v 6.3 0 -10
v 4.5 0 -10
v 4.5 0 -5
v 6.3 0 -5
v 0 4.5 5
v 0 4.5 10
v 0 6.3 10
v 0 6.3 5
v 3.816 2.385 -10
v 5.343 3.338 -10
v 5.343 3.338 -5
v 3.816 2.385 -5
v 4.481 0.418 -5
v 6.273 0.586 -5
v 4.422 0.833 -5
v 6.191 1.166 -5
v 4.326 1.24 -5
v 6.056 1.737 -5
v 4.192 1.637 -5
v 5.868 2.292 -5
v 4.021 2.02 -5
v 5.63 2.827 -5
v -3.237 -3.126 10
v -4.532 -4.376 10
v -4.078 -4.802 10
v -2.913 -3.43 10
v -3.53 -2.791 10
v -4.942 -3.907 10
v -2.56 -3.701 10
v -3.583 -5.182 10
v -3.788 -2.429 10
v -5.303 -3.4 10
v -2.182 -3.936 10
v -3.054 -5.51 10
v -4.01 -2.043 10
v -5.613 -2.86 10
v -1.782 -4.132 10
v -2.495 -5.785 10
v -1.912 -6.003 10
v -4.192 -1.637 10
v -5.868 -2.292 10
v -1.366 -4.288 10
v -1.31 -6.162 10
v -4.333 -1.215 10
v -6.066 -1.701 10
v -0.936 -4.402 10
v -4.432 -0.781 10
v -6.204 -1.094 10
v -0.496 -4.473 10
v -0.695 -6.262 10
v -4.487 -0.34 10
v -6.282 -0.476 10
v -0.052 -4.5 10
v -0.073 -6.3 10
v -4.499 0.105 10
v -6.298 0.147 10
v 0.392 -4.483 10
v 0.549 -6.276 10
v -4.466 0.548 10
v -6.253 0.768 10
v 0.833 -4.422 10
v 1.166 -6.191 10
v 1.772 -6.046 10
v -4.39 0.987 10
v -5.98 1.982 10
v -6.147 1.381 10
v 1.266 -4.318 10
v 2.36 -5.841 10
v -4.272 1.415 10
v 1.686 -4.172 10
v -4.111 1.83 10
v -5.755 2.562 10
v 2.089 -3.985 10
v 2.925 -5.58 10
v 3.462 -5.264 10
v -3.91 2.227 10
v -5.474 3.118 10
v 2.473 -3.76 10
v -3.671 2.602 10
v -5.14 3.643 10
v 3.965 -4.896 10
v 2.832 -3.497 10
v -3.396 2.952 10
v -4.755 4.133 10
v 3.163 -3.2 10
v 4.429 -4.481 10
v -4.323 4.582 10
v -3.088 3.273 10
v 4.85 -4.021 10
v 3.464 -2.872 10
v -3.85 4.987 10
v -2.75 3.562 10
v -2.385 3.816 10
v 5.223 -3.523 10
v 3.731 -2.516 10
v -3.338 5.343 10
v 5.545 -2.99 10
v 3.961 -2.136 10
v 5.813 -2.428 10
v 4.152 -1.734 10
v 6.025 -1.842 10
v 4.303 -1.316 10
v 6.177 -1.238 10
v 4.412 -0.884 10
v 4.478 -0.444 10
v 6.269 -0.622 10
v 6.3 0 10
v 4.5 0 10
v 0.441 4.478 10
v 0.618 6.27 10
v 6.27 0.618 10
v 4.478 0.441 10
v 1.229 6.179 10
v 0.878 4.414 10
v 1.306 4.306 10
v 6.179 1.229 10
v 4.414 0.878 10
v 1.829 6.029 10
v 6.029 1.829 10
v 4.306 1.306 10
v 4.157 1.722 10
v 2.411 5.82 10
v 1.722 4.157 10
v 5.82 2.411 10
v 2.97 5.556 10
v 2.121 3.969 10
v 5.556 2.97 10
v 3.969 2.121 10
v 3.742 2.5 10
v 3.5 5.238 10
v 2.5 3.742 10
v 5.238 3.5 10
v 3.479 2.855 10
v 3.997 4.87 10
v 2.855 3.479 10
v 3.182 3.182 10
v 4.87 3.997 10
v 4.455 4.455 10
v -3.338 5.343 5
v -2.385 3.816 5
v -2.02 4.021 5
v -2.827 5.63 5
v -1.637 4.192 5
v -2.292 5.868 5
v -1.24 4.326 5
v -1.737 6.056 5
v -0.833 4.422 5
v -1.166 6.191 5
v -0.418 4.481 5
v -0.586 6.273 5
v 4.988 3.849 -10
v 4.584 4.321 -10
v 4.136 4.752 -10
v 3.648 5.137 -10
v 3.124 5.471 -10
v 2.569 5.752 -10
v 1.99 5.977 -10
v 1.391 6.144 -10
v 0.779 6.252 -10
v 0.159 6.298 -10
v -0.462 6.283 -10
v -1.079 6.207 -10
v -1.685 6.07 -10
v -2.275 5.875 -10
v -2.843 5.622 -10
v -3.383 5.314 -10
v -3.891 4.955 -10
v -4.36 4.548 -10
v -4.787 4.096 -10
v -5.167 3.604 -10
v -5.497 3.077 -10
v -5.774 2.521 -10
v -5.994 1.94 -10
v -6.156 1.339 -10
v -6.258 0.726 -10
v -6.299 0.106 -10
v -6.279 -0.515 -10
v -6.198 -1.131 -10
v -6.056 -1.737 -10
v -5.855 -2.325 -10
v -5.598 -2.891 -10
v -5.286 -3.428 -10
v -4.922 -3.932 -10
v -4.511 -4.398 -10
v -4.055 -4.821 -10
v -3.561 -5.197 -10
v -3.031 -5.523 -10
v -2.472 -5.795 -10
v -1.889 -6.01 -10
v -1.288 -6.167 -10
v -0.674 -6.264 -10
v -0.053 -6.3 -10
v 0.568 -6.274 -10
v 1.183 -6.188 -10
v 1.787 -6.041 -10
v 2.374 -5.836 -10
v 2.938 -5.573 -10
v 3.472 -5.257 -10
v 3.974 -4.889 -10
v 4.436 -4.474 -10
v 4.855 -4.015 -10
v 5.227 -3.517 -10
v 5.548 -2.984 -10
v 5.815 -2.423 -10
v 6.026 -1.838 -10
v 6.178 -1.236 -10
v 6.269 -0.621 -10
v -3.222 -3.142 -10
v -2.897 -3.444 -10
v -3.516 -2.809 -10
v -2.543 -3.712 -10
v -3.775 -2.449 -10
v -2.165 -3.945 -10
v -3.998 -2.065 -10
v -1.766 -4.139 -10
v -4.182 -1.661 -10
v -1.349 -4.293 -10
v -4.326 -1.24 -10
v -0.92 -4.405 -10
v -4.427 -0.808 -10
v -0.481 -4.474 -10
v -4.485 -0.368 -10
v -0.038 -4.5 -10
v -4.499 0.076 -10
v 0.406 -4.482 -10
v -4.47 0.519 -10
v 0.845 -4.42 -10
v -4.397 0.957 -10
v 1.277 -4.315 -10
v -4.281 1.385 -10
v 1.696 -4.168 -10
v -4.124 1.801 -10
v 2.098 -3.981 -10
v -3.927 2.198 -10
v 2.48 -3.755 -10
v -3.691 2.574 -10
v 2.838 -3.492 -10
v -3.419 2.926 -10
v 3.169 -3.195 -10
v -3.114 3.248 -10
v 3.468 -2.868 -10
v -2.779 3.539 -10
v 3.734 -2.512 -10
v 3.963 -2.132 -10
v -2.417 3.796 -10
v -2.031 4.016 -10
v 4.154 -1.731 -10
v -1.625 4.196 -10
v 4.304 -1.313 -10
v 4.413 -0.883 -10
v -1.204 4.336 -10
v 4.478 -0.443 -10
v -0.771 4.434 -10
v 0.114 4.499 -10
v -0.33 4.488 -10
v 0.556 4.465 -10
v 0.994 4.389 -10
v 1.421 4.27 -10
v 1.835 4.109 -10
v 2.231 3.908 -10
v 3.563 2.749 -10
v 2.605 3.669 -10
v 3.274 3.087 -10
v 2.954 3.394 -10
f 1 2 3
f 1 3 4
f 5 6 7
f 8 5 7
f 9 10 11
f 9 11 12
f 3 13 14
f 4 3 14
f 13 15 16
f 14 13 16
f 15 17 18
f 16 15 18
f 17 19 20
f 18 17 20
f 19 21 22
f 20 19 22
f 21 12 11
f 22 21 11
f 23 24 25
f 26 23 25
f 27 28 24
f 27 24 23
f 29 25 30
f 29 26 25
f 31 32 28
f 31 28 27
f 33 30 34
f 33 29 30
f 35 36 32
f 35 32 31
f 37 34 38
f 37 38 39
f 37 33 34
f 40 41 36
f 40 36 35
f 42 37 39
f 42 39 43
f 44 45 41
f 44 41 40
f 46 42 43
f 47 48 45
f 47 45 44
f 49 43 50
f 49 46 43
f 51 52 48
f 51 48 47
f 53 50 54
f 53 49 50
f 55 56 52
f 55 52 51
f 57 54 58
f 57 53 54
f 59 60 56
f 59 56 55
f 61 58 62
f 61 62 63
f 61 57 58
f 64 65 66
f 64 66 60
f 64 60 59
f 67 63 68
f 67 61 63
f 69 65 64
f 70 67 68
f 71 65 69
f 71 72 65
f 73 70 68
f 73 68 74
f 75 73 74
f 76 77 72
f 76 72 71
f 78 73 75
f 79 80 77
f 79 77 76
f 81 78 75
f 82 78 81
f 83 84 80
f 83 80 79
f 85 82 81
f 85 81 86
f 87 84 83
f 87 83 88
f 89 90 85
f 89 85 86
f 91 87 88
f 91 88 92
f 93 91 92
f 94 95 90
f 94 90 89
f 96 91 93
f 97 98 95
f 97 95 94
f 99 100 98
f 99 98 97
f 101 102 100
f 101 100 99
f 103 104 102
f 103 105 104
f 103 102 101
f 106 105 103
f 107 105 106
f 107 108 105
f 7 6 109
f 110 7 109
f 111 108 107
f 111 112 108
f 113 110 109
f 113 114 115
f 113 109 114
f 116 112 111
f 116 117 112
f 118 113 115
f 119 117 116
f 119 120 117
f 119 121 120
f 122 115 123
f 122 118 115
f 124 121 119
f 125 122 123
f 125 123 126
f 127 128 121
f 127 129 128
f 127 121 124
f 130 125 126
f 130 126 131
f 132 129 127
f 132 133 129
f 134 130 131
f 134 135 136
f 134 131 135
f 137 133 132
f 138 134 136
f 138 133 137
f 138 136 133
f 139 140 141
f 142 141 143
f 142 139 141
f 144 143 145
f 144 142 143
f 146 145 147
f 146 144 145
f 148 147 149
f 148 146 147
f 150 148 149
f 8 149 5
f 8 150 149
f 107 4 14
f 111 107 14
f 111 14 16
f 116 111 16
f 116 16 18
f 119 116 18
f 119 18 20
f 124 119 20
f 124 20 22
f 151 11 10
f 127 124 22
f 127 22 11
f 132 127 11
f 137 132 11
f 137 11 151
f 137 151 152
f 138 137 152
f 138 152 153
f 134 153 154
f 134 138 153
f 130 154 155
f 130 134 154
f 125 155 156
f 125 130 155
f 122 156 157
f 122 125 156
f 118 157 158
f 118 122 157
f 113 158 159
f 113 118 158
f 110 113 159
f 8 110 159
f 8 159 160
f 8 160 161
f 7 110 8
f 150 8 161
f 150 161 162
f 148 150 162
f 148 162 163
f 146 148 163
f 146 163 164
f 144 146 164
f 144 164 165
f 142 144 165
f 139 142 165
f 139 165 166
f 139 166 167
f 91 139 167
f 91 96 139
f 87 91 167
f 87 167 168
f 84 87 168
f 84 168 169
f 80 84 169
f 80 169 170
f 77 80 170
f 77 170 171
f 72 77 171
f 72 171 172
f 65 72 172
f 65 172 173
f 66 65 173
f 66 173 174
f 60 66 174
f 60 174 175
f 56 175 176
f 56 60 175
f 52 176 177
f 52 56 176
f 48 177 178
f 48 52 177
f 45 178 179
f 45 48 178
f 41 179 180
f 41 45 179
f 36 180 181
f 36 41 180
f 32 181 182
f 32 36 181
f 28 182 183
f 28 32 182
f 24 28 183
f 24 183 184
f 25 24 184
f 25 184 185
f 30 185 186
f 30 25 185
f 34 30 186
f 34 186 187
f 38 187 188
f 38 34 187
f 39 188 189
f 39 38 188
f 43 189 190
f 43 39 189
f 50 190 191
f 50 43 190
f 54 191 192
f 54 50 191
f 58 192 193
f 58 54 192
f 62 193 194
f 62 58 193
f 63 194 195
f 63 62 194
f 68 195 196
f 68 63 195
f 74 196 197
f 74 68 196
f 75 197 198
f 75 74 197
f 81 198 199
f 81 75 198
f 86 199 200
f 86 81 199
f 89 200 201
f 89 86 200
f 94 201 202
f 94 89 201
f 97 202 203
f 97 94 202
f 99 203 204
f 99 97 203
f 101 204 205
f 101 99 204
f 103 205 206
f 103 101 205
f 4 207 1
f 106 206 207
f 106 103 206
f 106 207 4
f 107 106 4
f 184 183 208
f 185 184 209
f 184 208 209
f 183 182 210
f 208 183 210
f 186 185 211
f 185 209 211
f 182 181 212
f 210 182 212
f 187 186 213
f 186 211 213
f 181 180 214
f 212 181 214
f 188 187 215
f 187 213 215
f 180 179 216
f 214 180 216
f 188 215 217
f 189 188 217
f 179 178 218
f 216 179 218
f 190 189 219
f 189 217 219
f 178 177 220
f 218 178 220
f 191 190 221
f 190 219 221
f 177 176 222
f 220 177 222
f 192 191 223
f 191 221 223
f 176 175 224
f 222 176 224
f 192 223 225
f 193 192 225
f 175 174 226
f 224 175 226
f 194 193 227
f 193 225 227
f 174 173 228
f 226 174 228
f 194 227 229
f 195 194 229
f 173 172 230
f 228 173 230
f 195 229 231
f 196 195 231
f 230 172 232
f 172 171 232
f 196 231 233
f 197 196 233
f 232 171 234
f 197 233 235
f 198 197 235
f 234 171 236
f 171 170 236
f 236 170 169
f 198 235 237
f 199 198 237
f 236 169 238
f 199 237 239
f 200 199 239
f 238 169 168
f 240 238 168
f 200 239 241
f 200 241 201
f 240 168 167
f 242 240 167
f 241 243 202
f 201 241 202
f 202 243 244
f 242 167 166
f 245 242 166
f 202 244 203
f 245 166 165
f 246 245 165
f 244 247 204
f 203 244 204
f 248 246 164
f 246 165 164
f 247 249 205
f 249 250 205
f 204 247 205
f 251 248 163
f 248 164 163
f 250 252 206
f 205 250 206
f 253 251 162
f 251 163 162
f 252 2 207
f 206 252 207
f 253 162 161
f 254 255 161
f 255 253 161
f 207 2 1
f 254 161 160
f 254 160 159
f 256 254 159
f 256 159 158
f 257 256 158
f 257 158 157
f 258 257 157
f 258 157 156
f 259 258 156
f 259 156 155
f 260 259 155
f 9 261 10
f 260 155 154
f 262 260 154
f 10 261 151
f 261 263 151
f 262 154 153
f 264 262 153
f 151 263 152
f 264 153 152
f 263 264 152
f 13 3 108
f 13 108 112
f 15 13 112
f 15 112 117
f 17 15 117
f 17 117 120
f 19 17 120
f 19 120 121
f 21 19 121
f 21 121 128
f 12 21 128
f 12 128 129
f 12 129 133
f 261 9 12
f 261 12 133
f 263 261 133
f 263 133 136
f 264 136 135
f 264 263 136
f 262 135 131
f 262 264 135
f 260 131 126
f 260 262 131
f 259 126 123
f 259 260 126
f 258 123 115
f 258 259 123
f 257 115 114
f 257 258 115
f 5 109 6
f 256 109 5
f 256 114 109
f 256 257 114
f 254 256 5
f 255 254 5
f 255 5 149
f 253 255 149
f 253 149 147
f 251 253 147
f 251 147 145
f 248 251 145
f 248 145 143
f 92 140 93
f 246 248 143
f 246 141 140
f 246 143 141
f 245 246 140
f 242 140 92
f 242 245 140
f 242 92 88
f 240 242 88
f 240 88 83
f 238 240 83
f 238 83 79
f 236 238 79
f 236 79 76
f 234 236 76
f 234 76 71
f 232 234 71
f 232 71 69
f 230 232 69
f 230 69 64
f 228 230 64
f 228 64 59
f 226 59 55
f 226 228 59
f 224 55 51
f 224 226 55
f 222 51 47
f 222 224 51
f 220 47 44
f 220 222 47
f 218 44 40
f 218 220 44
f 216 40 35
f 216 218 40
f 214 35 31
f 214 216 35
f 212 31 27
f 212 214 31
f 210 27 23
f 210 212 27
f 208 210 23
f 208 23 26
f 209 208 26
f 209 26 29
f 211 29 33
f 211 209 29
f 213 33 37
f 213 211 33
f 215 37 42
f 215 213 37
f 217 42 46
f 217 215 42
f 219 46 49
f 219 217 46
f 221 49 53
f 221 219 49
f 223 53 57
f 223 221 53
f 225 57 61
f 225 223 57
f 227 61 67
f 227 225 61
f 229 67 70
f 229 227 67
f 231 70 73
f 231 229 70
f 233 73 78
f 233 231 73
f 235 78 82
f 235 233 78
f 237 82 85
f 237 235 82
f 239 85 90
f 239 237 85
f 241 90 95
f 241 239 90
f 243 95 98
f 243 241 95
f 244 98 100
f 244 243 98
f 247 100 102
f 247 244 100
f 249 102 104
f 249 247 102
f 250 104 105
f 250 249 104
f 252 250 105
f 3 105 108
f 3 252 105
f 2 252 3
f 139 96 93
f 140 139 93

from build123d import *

# Parameters (mm, degrees)
BOSS_EXTRUDE1_DEPTH      = 10
BOSS_EXTRUDE1_DEPTH_BACK = 10
SKETCH1_R                = 6.5
SKETCH1_R_2              = 4.5
CUT_EXTRUDE2_DEPTH       = 5
SKETCH4_R                = 6.5
SKETCH4_R_2              = 6.3
CUT_EXTRUDE4_DEPTH       = 23.011360703
CUT_EXTRUDE3_DEPTH       = 5


with BuildPart() as part:
    # Sketch1 → Boss-Extrude1 (new, two sides: drawn at the far end of the back side and taken through both)
    with BuildSketch(Plane.XY.offset(-BOSS_EXTRUDE1_DEPTH_BACK)):
        Circle(SKETCH1_R)
        Circle(SKETCH1_R_2, mode=Mode.SUBTRACT)
    extrude(amount=BOSS_EXTRUDE1_DEPTH + BOSS_EXTRUDE1_DEPTH_BACK)

    # Sketch2 → Cut-Extrude2 (cut)
    with BuildSketch(Plane.XY.offset(10)):
        with BuildLine():
            Line((-6.230040483, 9.970148902), (0, 0))
            Line((0, 0), (0, 11.756584264))
            ThreePointArc((0, 11.756584264), (-3.2405538, 11.301154128), (-6.230040483, 9.970148902))
        make_face()
    extrude(amount=-CUT_EXTRUDE2_DEPTH, mode=Mode.SUBTRACT)

    # Sketch4 → Cut-Extrude4 (cut, through all)
    with BuildSketch(Plane.XY.offset(10)):
        Circle(SKETCH4_R)
        Circle(SKETCH4_R_2, mode=Mode.SUBTRACT)
    extrude(amount=-CUT_EXTRUDE4_DEPTH, mode=Mode.SUBTRACT)

    # Sketch3 → Cut-Extrude3 (cut)
    with BuildSketch(Plane.XY.offset(-10)):
        with BuildLine():
            Line((9.970148902, 6.230040483), (0, 0))
            Line((0, 0), (11.756584264, 0))
            ThreePointArc((11.756584264, 0), (11.301154128, 3.2405538), (9.970148902, 6.230040483))
        make_face()
    extrude(amount=CUT_EXTRUDE3_DEPTH, mode=Mode.SUBTRACT)


solid = part.part
